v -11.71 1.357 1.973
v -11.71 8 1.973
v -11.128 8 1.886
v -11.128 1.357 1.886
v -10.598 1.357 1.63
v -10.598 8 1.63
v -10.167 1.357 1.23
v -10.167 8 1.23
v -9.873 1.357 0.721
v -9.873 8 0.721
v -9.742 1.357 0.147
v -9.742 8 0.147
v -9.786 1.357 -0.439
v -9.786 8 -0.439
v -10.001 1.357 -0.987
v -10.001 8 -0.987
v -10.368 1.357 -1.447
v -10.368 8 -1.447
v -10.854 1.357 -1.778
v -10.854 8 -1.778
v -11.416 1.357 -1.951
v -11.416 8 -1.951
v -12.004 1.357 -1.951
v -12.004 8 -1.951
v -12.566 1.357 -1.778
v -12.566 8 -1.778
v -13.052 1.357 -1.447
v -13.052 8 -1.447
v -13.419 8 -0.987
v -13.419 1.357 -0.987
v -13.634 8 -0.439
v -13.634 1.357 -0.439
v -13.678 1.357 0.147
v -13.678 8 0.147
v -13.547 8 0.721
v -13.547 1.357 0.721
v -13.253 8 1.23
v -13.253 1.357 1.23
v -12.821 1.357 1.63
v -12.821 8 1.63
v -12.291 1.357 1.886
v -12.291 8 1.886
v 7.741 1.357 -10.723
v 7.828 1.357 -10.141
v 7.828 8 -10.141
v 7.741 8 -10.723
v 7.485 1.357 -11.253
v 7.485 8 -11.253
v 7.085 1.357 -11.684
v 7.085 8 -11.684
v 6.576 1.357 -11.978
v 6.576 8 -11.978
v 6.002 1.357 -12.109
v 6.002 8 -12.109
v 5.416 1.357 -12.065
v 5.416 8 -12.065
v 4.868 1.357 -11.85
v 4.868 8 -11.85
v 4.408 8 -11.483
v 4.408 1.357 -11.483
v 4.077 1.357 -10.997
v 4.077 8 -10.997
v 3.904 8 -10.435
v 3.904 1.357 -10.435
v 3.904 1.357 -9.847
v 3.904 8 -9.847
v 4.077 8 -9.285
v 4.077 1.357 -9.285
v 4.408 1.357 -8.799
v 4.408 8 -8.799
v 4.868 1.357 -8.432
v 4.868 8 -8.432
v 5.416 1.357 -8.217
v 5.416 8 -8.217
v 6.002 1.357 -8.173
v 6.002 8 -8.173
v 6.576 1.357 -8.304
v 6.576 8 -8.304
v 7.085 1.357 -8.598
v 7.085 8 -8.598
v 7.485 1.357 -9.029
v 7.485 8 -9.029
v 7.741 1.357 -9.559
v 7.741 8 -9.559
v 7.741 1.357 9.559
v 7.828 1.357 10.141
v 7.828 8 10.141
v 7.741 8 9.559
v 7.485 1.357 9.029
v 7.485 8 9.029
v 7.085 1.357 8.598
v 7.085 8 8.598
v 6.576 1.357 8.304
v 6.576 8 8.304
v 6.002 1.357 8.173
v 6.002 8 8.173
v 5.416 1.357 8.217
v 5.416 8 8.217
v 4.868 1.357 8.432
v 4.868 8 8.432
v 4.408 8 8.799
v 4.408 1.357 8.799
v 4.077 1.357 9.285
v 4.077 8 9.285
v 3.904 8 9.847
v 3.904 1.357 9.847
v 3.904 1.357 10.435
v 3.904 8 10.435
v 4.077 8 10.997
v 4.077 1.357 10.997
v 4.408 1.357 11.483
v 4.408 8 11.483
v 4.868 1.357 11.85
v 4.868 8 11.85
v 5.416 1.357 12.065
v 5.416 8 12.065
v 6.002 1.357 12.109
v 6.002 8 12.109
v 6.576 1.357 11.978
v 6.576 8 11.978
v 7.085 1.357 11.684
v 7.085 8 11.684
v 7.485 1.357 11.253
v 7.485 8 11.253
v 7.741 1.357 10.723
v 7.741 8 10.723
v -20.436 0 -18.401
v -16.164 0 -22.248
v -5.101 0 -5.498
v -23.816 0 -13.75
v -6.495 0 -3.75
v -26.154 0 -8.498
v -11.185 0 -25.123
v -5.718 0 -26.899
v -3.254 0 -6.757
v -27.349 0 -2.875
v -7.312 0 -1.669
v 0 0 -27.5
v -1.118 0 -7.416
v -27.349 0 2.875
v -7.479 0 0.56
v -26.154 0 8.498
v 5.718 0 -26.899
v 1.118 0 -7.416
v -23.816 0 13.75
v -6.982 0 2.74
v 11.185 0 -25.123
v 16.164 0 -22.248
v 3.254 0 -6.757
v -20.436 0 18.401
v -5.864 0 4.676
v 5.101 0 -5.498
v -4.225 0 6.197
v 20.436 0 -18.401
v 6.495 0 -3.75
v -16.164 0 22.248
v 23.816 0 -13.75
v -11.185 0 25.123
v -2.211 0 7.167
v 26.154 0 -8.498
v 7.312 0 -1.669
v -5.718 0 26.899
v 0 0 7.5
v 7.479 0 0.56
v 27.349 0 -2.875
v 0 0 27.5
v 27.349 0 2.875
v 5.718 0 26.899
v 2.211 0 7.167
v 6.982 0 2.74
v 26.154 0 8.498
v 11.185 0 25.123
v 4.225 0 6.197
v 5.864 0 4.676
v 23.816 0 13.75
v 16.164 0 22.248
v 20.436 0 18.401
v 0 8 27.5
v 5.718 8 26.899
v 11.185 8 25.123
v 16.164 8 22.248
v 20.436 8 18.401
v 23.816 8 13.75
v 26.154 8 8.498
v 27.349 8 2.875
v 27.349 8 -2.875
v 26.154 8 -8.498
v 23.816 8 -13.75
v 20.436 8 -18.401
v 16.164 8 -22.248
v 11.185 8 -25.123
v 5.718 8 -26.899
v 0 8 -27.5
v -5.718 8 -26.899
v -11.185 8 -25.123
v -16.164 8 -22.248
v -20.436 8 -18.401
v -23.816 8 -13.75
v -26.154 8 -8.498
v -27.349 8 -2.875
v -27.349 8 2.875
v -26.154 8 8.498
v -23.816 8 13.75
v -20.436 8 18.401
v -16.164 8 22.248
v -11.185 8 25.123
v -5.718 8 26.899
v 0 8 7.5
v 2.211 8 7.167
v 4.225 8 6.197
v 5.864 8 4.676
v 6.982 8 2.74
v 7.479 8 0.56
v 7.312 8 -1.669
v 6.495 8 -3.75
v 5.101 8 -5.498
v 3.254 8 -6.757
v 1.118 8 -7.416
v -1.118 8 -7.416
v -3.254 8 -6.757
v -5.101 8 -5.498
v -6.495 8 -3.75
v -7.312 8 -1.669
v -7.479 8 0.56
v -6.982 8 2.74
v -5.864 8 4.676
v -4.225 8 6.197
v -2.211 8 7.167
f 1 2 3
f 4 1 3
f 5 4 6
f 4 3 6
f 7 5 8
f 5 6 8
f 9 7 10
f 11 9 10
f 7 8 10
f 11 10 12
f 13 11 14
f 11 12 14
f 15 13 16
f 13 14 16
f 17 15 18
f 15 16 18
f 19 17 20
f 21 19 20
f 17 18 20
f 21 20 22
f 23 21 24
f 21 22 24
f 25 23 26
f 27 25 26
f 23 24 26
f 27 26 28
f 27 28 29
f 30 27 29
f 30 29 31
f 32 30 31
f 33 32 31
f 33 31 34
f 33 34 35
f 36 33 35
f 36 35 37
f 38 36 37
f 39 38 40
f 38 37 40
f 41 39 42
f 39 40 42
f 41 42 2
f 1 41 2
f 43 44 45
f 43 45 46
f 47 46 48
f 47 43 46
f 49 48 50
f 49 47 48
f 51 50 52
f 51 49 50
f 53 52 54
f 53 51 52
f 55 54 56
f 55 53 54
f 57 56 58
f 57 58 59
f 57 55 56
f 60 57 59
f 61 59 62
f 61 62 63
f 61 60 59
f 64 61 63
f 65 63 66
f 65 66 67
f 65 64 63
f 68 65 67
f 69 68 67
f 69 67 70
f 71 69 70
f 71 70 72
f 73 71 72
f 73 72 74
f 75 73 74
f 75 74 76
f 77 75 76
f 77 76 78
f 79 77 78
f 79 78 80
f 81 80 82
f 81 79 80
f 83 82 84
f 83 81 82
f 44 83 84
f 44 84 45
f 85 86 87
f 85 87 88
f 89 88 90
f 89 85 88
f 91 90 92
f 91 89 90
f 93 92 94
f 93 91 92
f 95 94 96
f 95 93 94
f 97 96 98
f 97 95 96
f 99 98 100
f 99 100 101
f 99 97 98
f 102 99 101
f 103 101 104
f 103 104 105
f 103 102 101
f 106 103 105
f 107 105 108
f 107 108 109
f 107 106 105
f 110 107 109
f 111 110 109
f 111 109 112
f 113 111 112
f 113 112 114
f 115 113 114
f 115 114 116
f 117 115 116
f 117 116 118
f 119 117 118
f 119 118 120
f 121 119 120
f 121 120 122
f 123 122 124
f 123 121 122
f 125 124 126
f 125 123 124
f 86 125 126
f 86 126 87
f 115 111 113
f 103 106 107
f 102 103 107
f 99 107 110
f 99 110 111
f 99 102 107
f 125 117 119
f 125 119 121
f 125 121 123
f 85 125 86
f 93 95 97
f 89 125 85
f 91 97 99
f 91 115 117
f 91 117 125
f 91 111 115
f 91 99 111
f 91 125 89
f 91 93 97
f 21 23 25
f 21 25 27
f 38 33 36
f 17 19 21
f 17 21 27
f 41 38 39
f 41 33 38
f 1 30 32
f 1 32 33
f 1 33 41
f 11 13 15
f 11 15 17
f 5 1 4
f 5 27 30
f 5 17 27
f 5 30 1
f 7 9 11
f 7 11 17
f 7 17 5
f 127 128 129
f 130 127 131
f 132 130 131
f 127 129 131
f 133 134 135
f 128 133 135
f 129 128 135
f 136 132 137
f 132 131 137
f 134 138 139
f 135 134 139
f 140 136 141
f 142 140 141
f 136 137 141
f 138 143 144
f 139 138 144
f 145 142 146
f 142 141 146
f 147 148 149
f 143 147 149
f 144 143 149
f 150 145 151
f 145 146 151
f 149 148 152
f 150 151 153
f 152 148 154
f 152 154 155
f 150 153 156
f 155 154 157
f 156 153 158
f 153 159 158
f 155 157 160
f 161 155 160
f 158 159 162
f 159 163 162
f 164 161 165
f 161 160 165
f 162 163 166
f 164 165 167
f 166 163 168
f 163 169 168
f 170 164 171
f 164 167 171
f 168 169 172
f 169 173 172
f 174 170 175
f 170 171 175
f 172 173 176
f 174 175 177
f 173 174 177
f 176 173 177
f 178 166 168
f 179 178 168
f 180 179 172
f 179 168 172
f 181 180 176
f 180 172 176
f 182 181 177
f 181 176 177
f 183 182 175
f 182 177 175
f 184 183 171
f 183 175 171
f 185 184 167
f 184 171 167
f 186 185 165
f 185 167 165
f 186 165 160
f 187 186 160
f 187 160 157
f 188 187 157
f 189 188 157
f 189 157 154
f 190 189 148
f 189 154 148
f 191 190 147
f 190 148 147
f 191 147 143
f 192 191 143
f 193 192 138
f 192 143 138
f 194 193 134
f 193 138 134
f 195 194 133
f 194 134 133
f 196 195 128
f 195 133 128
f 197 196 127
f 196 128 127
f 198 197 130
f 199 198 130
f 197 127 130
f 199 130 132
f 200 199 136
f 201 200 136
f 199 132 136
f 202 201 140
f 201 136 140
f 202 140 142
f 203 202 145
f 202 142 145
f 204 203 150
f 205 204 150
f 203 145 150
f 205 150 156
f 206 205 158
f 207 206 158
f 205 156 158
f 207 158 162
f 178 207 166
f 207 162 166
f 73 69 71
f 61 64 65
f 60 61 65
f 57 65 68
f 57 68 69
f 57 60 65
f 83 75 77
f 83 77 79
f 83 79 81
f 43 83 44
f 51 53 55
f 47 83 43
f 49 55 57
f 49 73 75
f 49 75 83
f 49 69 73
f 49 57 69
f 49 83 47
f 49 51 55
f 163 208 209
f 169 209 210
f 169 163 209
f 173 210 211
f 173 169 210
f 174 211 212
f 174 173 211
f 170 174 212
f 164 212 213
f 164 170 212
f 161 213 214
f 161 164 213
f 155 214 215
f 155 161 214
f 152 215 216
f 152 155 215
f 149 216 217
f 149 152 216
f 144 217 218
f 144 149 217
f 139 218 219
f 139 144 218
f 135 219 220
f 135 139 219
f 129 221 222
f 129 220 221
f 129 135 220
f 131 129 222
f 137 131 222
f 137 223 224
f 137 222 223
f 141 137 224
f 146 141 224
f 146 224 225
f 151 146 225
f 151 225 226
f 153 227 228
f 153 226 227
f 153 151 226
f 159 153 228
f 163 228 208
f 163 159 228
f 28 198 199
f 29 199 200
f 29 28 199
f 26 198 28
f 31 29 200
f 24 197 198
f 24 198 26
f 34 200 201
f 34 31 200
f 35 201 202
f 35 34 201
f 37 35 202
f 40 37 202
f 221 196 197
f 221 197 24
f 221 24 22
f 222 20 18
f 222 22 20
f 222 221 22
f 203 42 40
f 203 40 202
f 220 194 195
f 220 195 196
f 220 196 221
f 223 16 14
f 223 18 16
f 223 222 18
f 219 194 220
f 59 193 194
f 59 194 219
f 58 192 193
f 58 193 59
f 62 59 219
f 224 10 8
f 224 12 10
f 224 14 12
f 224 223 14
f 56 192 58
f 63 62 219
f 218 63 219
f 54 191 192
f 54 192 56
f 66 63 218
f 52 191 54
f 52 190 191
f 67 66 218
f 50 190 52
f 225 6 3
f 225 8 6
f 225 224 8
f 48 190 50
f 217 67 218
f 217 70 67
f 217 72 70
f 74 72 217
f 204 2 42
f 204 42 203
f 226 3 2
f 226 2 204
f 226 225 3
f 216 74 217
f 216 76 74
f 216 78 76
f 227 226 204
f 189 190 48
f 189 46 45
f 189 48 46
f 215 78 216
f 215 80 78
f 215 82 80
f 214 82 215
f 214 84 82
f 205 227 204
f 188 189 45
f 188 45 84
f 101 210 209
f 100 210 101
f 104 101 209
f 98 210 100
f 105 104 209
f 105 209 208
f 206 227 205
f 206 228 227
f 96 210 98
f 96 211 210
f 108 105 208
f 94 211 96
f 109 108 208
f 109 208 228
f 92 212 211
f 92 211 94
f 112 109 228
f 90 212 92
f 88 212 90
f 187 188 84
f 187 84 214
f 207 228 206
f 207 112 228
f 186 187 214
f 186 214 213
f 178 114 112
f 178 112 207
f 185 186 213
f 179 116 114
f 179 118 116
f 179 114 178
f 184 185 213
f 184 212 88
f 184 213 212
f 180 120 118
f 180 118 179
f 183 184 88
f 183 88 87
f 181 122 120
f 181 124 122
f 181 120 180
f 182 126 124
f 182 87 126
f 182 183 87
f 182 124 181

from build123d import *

# Parameters (mm, degrees)
SKETCH1_R           = 27.5
BOSS_EXTRUDE1_DEPTH = 8
SKETCH2_R           = 7.5
CUT_EXTRUDE1_DEPTH  = 40.705163392
SKETCH3_R           = 1.973316749
CUT_EXTRUDE2_DEPTH  = 6.642946017
CIRPATTERN1_COUNT   = 3


with BuildPart() as part:
    # Sketch1 → Boss-Extrude1 (new body)
    with BuildSketch(Plane(origin=(0, 0, 0), x_dir=(1, 0, 0), z_dir=(0, 1, 0))):
        Circle(SKETCH1_R)
    extrude(amount=BOSS_EXTRUDE1_DEPTH)

    # Sketch2 → Cut-Extrude1 (cut, through all)
    with BuildSketch(Plane(origin=(0, 0, 0), x_dir=(1, 0, 0), z_dir=(0, 1, 0))):
        Circle(SKETCH2_R)
    extrude(amount=CUT_EXTRUDE1_DEPTH, mode=Mode.SUBTRACT)

    # Sketch3 → Cut-Extrude2 (cut)
    with BuildSketch(Plane(origin=(0, 8, 0), x_dir=(1, 0, 0), z_dir=(0, 1, 0))):
        with Locations((-11.709849239, 0)):
            Circle(SKETCH3_R)
    cut_extrude2 = extrude(amount=-CUT_EXTRUDE2_DEPTH, mode=Mode.SUBTRACT)

    # CirPattern1: Cut-Extrude2 ×3 about axis
    cirpattern1_axis = Axis((0, 0, 0), (0, 1, 0))
    for i in range(1, CIRPATTERN1_COUNT):
        add(cut_extrude2.rotate(cirpattern1_axis, i * 360 / CIRPATTERN1_COUNT), mode=Mode.SUBTRACT)


solid = part.part
